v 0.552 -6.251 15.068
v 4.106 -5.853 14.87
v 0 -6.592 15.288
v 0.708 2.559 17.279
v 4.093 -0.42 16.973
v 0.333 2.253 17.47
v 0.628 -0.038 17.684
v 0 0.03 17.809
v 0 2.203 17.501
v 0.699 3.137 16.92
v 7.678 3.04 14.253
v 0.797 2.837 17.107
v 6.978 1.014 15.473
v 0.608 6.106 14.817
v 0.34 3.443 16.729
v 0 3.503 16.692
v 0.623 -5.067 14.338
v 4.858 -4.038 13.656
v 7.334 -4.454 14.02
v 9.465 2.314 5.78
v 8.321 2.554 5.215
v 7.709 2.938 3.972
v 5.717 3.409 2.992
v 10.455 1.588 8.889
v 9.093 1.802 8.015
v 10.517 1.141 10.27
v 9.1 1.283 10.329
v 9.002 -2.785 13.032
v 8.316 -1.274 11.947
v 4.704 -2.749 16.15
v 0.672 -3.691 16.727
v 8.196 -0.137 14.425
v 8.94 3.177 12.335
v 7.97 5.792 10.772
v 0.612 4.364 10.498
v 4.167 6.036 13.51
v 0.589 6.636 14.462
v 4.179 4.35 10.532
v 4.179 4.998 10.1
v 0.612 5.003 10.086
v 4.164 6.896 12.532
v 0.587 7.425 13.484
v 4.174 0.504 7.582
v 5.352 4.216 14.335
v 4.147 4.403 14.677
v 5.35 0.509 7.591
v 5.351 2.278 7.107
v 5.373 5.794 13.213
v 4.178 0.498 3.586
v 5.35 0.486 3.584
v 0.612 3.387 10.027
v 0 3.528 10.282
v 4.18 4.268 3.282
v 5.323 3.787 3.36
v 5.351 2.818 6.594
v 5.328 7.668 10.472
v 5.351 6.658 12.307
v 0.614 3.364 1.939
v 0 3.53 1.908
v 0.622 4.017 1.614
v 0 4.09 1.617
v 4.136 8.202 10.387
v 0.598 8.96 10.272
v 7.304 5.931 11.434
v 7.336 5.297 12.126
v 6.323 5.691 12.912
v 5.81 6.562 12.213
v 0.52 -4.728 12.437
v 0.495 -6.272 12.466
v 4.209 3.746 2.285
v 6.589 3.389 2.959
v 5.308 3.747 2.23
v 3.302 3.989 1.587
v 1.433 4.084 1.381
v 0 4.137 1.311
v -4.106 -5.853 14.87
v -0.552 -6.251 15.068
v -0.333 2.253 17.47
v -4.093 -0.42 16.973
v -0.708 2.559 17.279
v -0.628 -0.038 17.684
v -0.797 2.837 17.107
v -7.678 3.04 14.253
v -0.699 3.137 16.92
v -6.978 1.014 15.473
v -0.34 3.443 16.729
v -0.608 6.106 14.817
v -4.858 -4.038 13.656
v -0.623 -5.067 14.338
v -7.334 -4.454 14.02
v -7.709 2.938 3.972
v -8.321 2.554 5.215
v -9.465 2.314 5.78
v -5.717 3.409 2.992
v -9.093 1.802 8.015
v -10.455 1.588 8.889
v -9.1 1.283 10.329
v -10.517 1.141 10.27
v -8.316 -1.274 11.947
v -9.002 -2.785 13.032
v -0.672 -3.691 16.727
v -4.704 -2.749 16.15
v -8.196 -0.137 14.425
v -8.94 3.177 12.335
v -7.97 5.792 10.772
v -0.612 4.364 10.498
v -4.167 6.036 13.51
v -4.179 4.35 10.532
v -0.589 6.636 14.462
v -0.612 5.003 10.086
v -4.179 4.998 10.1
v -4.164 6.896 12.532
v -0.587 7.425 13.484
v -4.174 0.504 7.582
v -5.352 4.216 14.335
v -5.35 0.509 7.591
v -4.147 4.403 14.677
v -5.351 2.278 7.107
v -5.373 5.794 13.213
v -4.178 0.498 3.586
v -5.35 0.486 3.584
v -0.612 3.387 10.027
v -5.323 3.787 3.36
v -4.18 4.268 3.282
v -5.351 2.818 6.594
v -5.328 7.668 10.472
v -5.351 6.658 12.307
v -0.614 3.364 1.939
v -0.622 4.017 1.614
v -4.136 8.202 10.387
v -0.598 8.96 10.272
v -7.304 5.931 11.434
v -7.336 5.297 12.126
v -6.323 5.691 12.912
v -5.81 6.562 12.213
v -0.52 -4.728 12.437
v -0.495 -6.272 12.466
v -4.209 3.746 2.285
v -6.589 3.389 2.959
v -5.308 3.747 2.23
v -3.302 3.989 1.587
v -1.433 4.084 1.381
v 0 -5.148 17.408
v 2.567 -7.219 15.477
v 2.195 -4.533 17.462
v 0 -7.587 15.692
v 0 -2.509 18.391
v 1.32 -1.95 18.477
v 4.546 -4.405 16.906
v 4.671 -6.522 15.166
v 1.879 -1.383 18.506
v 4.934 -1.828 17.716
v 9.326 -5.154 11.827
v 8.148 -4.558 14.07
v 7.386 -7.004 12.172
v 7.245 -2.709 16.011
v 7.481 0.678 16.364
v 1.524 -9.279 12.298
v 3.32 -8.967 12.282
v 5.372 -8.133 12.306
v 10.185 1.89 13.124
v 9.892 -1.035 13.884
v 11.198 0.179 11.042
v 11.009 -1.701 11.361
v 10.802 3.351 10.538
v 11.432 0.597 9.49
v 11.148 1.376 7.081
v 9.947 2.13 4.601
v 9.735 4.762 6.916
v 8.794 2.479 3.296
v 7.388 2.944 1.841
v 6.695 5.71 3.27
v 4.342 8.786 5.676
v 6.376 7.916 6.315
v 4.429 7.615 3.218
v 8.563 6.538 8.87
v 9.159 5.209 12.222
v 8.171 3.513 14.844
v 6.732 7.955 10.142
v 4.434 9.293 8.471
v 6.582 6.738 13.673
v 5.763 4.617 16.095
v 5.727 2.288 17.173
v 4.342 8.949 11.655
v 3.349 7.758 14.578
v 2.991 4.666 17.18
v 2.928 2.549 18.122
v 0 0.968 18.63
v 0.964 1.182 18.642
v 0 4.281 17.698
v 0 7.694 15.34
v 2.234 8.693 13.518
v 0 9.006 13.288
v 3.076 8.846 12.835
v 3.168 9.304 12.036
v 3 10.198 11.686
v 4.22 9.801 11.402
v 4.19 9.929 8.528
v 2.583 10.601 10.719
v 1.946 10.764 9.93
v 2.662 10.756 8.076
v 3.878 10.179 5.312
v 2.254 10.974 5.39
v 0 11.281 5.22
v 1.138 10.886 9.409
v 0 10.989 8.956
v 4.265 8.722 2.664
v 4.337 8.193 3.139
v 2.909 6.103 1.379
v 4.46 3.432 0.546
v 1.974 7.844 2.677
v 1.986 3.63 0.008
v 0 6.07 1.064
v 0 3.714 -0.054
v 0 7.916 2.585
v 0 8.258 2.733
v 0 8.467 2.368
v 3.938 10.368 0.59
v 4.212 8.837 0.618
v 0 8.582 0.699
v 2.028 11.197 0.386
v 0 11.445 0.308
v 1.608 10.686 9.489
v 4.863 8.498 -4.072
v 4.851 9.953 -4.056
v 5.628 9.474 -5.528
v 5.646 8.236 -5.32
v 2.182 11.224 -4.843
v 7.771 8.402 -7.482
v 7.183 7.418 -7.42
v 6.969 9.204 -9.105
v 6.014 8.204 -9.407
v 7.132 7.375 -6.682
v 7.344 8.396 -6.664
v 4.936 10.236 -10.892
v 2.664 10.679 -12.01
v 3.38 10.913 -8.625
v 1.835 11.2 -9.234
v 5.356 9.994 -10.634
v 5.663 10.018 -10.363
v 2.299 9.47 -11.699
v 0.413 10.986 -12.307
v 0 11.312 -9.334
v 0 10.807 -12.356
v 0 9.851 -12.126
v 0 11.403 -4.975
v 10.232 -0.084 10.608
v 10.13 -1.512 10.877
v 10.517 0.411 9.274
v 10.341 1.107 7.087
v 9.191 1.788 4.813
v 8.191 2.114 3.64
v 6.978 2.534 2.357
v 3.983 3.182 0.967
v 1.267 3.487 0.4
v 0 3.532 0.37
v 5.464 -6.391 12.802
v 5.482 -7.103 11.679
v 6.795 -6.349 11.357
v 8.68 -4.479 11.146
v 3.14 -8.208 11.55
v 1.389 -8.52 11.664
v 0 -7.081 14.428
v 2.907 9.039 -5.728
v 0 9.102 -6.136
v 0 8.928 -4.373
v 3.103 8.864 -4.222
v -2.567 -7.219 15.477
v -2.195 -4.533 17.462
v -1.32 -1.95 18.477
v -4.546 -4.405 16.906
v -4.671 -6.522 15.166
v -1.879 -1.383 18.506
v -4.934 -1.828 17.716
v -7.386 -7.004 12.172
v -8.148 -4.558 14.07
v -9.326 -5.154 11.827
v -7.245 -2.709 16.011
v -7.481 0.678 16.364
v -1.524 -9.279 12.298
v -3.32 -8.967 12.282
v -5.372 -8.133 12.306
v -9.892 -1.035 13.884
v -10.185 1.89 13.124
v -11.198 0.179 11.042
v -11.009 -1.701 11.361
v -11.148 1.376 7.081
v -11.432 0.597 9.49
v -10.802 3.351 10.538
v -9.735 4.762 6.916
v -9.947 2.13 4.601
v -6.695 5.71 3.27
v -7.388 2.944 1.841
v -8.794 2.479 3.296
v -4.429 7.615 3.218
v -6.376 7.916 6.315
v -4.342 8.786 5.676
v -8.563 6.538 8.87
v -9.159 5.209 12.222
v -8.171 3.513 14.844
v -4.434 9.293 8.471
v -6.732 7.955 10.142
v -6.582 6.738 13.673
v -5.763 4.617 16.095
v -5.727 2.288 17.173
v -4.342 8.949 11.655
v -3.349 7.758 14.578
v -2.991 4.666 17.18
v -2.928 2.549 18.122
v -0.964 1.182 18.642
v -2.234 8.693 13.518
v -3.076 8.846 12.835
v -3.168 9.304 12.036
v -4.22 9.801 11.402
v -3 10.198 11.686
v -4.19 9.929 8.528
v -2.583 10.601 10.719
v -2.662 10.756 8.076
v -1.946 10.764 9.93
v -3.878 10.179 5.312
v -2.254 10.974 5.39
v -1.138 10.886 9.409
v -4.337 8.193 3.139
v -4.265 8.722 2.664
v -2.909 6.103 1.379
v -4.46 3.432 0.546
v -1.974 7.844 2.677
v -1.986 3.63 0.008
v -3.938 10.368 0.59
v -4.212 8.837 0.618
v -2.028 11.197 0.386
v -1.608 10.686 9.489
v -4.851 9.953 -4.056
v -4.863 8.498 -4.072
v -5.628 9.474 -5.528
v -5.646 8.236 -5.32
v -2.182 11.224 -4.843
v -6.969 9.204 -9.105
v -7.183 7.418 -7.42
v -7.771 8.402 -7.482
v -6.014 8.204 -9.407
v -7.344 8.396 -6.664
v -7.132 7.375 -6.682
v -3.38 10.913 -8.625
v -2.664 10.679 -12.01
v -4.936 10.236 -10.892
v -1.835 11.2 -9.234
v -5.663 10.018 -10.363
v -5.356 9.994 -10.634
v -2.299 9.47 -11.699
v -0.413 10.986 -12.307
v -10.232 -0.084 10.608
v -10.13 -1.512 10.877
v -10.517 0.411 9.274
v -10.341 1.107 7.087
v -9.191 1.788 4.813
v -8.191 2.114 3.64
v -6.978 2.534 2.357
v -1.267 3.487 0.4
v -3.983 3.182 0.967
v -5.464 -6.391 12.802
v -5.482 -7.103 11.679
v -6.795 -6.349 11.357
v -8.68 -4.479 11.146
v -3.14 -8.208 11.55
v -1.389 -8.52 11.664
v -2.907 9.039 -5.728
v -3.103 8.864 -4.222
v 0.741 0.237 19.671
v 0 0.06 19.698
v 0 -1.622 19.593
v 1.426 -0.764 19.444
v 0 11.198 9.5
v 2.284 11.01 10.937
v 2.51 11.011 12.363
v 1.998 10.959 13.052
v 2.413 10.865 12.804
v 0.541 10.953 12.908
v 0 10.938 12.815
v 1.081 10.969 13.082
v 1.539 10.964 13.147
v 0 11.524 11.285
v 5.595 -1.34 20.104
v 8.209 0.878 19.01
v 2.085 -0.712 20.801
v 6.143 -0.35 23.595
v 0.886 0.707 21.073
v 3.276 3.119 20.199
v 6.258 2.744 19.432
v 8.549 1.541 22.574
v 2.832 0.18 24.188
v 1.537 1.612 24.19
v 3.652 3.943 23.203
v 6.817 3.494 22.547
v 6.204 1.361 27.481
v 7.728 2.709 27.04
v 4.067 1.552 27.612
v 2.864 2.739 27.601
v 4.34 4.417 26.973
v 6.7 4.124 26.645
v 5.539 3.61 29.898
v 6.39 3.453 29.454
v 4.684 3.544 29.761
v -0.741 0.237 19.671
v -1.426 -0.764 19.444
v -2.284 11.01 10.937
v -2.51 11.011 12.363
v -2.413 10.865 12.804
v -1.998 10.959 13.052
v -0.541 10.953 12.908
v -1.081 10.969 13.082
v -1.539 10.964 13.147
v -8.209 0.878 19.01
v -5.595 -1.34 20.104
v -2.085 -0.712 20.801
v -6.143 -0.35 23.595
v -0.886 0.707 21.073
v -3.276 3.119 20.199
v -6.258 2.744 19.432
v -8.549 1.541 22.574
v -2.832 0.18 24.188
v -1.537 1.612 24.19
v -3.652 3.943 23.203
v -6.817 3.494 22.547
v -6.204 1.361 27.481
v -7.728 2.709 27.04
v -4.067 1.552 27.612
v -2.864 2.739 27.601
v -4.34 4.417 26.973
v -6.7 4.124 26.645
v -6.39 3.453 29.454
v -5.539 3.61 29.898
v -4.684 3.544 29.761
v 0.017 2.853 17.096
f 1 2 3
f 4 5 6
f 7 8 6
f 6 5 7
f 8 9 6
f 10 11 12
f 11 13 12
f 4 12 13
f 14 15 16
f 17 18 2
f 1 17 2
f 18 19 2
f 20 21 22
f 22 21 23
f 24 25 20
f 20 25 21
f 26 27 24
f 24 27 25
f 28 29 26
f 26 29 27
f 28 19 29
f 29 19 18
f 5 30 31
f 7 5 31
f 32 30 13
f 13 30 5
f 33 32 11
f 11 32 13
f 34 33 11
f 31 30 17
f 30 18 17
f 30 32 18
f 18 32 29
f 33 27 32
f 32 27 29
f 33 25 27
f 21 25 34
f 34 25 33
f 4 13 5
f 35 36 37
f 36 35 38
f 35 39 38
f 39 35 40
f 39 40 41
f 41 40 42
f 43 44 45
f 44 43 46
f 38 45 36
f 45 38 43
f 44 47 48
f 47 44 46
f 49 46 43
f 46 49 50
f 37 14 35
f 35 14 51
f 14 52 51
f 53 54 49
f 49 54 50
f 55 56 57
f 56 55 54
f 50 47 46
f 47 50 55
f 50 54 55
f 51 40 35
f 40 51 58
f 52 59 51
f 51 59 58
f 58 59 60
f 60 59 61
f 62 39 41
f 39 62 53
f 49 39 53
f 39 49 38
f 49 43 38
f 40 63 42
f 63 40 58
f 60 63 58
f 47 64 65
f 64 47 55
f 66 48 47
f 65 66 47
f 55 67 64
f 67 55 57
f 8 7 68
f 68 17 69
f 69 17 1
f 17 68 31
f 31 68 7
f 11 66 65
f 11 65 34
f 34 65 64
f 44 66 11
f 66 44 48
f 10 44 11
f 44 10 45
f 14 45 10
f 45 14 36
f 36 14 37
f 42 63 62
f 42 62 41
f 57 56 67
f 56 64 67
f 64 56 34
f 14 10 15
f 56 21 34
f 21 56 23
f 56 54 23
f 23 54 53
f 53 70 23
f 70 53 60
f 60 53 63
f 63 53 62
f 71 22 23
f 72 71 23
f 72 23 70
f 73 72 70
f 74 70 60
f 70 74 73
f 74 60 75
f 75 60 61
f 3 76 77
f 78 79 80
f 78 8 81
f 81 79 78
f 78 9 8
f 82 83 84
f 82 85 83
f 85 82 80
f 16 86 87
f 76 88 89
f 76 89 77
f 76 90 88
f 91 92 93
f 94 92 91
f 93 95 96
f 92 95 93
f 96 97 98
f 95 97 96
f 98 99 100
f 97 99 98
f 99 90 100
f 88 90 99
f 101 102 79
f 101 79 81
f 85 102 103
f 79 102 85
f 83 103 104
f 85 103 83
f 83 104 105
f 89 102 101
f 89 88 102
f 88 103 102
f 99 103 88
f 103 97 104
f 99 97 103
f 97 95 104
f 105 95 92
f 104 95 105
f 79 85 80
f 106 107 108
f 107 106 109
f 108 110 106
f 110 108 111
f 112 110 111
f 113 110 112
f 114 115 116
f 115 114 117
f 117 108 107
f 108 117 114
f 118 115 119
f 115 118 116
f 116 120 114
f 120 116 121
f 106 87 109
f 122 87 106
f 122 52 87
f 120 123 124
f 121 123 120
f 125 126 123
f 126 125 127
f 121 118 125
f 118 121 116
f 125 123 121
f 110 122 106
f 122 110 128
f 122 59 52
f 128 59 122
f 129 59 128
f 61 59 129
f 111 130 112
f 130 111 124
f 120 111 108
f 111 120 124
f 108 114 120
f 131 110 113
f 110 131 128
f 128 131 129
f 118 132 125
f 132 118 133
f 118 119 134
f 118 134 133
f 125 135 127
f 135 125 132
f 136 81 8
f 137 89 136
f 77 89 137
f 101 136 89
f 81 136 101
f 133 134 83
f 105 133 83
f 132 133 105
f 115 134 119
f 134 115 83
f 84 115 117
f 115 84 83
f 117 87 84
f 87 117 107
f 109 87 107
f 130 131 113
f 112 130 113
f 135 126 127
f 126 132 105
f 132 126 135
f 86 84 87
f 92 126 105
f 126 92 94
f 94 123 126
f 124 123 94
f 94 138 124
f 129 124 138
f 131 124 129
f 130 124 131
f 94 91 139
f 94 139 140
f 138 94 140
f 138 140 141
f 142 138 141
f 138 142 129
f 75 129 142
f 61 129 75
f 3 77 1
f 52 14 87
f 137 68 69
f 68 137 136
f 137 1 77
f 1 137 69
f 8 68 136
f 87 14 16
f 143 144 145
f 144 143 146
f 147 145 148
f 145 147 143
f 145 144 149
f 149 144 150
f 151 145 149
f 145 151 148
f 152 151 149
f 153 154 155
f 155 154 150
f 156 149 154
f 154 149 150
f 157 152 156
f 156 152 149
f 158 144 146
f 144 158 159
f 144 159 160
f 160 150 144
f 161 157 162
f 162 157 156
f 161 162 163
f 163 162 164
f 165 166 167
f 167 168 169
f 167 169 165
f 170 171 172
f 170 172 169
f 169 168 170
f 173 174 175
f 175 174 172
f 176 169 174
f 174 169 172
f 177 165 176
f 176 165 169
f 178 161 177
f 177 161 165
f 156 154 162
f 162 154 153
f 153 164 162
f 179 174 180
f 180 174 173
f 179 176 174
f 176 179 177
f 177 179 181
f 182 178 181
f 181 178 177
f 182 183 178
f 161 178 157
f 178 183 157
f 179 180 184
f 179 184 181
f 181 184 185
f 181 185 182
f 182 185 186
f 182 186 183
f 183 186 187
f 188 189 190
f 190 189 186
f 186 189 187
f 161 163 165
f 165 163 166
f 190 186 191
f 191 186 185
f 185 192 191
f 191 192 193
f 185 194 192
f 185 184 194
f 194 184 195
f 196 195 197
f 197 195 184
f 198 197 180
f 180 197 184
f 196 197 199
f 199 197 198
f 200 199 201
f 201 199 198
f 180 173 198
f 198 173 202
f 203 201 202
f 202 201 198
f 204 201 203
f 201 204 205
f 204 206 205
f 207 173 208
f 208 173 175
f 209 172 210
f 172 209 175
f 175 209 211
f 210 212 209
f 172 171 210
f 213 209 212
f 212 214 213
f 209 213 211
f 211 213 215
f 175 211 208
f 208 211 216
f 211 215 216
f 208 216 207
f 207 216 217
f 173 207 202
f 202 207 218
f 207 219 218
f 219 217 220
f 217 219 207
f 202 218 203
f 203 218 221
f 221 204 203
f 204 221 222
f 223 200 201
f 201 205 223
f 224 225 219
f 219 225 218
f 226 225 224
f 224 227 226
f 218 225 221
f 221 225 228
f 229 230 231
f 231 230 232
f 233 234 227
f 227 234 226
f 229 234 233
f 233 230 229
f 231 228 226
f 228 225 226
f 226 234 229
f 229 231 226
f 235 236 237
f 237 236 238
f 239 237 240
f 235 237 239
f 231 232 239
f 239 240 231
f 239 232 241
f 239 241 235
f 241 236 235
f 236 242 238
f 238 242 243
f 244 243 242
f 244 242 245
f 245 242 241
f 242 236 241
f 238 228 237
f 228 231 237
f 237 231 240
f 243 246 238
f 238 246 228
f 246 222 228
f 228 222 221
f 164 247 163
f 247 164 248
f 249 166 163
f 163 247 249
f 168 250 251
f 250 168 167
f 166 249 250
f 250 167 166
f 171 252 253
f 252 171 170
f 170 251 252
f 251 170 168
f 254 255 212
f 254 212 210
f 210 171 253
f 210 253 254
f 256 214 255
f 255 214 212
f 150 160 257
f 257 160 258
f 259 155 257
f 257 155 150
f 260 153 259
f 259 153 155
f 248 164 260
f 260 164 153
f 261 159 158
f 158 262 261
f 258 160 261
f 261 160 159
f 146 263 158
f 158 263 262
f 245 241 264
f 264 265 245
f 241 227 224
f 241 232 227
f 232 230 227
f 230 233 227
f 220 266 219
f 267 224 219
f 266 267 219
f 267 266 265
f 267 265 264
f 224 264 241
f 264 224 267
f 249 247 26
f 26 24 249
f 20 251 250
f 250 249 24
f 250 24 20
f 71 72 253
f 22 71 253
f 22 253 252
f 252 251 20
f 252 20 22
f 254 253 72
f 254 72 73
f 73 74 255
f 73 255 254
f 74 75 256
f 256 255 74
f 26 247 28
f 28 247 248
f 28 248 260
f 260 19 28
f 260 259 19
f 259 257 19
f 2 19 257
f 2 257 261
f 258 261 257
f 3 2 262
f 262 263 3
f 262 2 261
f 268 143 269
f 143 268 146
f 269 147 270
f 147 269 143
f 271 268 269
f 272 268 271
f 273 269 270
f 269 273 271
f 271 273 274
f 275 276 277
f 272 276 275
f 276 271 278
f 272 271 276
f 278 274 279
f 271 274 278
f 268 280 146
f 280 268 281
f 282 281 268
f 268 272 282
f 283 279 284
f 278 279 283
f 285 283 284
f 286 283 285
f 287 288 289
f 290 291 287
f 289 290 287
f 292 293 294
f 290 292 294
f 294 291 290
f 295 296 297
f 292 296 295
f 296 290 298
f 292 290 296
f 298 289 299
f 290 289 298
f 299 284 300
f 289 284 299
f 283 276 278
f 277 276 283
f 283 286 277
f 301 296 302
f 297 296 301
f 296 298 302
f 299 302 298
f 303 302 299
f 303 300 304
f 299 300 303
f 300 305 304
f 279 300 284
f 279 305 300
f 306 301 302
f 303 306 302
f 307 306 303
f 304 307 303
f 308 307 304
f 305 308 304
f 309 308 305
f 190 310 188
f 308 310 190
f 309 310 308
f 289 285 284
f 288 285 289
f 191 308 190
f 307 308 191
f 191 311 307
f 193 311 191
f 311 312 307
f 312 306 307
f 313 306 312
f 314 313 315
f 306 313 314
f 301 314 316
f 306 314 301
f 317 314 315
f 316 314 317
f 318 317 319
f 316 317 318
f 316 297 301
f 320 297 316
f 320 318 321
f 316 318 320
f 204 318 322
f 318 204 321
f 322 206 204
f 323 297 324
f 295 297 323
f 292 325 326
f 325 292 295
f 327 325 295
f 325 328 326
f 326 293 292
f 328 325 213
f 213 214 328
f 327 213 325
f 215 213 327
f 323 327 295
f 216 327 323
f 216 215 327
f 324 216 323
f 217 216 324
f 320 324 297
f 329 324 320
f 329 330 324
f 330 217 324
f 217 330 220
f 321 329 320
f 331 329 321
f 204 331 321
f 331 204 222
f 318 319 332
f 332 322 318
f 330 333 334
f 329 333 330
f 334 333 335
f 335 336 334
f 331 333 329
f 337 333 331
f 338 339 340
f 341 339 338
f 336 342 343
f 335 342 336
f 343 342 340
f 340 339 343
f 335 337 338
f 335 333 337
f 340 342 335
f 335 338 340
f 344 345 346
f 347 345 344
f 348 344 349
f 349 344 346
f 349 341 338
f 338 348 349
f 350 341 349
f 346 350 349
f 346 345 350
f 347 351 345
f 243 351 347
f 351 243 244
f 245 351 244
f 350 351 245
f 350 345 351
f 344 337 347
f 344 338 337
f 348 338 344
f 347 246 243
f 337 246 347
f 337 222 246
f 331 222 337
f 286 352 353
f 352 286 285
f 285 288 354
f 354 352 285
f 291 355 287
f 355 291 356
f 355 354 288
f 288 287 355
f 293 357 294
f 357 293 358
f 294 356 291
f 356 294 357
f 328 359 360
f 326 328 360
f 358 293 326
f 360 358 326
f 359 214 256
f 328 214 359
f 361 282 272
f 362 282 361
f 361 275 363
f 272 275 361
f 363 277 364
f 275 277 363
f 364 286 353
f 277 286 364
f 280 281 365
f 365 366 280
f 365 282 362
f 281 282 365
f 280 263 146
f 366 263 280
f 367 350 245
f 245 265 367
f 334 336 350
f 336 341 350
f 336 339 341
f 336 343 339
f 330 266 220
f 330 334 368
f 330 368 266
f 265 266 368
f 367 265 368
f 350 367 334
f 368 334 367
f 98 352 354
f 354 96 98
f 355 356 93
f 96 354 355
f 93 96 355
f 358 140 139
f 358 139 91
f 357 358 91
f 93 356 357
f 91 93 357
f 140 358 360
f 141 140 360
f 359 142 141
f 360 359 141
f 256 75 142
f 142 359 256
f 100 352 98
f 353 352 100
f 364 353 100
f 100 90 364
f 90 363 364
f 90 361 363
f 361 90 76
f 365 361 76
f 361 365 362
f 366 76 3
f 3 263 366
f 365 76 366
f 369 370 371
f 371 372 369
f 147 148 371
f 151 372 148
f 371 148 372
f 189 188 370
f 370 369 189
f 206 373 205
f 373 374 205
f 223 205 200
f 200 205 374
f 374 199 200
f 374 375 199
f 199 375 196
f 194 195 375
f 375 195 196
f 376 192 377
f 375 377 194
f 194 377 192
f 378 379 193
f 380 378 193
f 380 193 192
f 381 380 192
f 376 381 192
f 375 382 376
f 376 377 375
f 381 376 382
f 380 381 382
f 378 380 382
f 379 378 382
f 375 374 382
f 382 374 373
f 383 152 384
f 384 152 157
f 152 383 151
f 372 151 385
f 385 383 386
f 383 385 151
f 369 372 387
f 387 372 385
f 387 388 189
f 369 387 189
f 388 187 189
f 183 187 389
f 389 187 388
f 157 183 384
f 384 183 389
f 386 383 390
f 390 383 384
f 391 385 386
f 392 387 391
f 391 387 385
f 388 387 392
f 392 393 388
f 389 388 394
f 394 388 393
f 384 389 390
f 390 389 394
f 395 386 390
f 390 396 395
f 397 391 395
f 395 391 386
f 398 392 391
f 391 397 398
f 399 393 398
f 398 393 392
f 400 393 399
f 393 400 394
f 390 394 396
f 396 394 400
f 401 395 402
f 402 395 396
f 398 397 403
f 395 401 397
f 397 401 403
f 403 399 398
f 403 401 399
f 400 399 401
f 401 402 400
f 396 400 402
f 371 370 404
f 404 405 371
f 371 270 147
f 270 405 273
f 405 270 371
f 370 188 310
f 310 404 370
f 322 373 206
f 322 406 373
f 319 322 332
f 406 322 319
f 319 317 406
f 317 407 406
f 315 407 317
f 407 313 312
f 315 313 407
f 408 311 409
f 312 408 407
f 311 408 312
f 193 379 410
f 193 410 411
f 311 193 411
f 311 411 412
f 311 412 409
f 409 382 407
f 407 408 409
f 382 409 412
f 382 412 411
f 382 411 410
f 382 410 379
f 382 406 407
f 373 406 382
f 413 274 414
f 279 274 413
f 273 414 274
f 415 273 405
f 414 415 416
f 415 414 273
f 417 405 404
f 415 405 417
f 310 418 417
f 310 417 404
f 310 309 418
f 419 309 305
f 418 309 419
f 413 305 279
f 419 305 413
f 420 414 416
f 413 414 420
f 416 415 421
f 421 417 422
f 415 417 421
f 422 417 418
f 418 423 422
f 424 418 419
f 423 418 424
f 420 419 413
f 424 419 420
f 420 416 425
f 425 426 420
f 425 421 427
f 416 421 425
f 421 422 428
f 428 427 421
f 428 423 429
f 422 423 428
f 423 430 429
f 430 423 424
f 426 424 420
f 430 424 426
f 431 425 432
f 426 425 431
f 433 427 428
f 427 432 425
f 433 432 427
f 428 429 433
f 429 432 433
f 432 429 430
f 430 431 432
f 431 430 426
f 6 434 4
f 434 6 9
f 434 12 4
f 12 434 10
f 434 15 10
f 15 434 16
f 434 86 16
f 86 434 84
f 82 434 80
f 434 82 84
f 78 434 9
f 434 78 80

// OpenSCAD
use <../lib.scad>
use <s/u9440s01.scad>
use <s/u9440s02.scad>
use <s/u9447s01.scad>
function ldraw_lib__u9440p01() = [
// 0 ~Minifig Hair Powerpuff Girls Blossom with Red Bowtie Pattern
// 0 Name: u9440p01.dat
// 0 Author: Magnus Forsberg [MagFors]
// 0 !LDRAW_ORG Part UPDATE 2023-05
// 0 !LICENSE Licensed under CC BY 4.0 : see CAreadme.txt
// 
// 0 BFC CERTIFY CCW
  [0,"BFC","CERTIFY"],
  [0,"BFC","CCW"],
// 
// 0 !KEYWORDS set 41288
// 
// 0 !HISTORY 2023-10-31 [OrionP] Official Update 2023-05
// 
// 
// 1 16 0 0 0 1 0 0 0 1 0 0 0 1 s\u9447s01.dat
  [1,16,0,0,0,1,0,0,0,1,0,0,0,1, ldraw_lib__s__u9447s01()],
// 1 16 0 0 0 1 0 0 0 1 0 0 0 1 s\u9440s01.dat
  [1,16,0,0,0,1,0,0,0,1,0,0,0,1, ldraw_lib__s__u9440s01()],
// 1 16 0 0 0 -1 0 0 0 1 0 0 0 1 s\u9440s01.dat
  [1,16,0,0,0,-1,0,0,0,1,0,0,0,1, ldraw_lib__s__u9440s01()],
// 1 4 0 0 0 1 0 0 0 1 0 0 0 1 s\u9440s02.dat
  [1,4,0,0,0,1,0,0,0,1,0,0,0,1, ldraw_lib__s__u9440s02()],
// 1 4 0 0 0 -1 0 0 0 1 0 0 0 1 s\u9440s02.dat
  [1,4,0,0,0,-1,0,0,0,1,0,0,0,1, ldraw_lib__s__u9440s02()],
// 
// 4 16 .833 -43.674 5.633 0 -43.753 5.507 .042 -42.741 7.1325 1.77 -43.198 6.398
  [4,16,.833,-43.674,5.633,0,-43.753,5.507,.042,-42.741,7.1325,1.77,-43.198,6.398],
// 4 16 1.993 -42.767 7.092 1.77 -43.198 6.398 .042 -42.741 7.1325 1.747 -42.299 7.842
  [4,16,1.993,-42.767,7.092,1.77,-43.198,6.398,.042,-42.741,7.1325,1.747,-42.299,7.842],
// 4 16 .85 -41.823 8.608 1.747 -42.299 7.842 .042 -42.741 7.1325 0 -41.729 8.758
  [4,16,.85,-41.823,8.608,1.747,-42.299,7.842,.042,-42.741,7.1325,0,-41.729,8.758],
// 4 16 -.85 -41.823 8.608 0 -41.729 8.758 .042 -42.741 7.1325 -1.747 -42.299 7.842
  [4,16,-.85,-41.823,8.608,0,-41.729,8.758,.042,-42.741,7.1325,-1.747,-42.299,7.842],
// 4 16 -1.993 -42.767 7.092 -1.747 -42.299 7.842 .042 -42.741 7.1325 -1.77 -43.198 6.398
  [4,16,-1.993,-42.767,7.092,-1.747,-42.299,7.842,.042,-42.741,7.1325,-1.77,-43.198,6.398],
// 4 16 -.833 -43.674 5.633 -1.77 -43.198 6.398 .042 -42.741 7.1325 0 -43.753 5.507
  [4,16,-.833,-43.674,5.633,-1.77,-43.198,6.398,.042,-42.741,7.1325,0,-43.753,5.507],
// 5 24 0 -41.729 8.758 -.85 -41.823 8.608 -1.435 -37.043 15.265 .042 -42.741 7.1325
  [5,24,0,-41.729,8.758,-.85,-41.823,8.608,-1.435,-37.043,15.265,.042,-42.741,7.1325],
// 5 24 -1.77 -43.198 6.398 -.833 -43.674 5.633 .042 -42.741 7.1325 -10.148 -42.433 -1.051
  [5,24,-1.77,-43.198,6.398,-.833,-43.674,5.633,.042,-42.741,7.1325,-10.148,-42.433,-1.051],
// 5 24 1.747 -42.299 7.842 .85 -41.823 8.608 .042 -42.741 7.1325 1.519 -37.043 15.265
  [5,24,1.747,-42.299,7.842,.85,-41.823,8.608,.042,-42.741,7.1325,1.519,-37.043,15.265],
// 5 24 -1.747 -42.299 7.842 -1.993 -42.767 7.092 .042 -42.741 7.1325 -19.11 -35.633 7.599
  [5,24,-1.747,-42.299,7.842,-1.993,-42.767,7.092,.042,-42.741,7.1325,-19.11,-35.633,7.599],
// 5 24 -1.993 -42.767 7.092 -1.77 -43.198 6.398 -1.747 -42.299 7.842 -17.36 -38.683 2.536
  [5,24,-1.993,-42.767,7.092,-1.77,-43.198,6.398,-1.747,-42.299,7.842,-17.36,-38.683,2.536],
// 5 24 .833 -43.674 5.633 1.77 -43.198 6.398 0 -43.753 5.507 10.232 -42.433 -1.051
  [5,24,.833,-43.674,5.633,1.77,-43.198,6.398,0,-43.753,5.507,10.232,-42.433,-1.051],
// 5 24 1.77 -43.198 6.398 1.993 -42.767 7.092 .042 -42.741 7.1325 17.444 -38.683 2.536
  [5,24,1.77,-43.198,6.398,1.993,-42.767,7.092,.042,-42.741,7.1325,17.444,-38.683,2.536],
// 5 24 .85 -41.823 8.608 0 -41.729 8.758 1.519 -37.043 15.265 1.747 -42.299 7.842
  [5,24,.85,-41.823,8.608,0,-41.729,8.758,1.519,-37.043,15.265,1.747,-42.299,7.842],
// 5 24 -.85 -41.823 8.608 -1.747 -42.299 7.842 -1.435 -37.043 15.265 0 -41.729 8.758
  [5,24,-.85,-41.823,8.608,-1.747,-42.299,7.842,-1.435,-37.043,15.265,0,-41.729,8.758],
// 5 24 -.833 -43.674 5.633 0 -43.753 5.507 -1.77 -43.198 6.398 0 -44.522 .075
  [5,24,-.833,-43.674,5.633,0,-43.753,5.507,-1.77,-43.198,6.398,0,-44.522,.075],
// 5 24 0 -43.753 5.507 .833 -43.674 5.633 0 -44.522 .075 .042 -42.741 7.1325
  [5,24,0,-43.753,5.507,.833,-43.674,5.633,0,-44.522,.075,.042,-42.741,7.1325],
// 5 24 1.993 -42.767 7.092 1.747 -42.299 7.842 1.77 -43.198 6.398 19.194 -35.633 7.599
  [5,24,1.993,-42.767,7.092,1.747,-42.299,7.842,1.77,-43.198,6.398,19.194,-35.633,7.599],
// 
// 2 24 0 23.334 28.281 0 30.889 27.017
  [2,24,0,23.334,28.281,0,30.889,27.017],
// 2 24 0 -36.071 -17.703 0 -39.231 -18.968
  [2,24,0,-36.071,-17.703,0,-39.231,-18.968],
// 5 24 0 -45.978 -6.272 0 -43.521 -12.871 3.301 -46.192 -4.874 -3.301 -46.192 -4.874
  [5,24,0,-45.978,-6.272,0,-43.521,-12.871,3.301,-46.192,-4.874,-3.301,-46.192,-4.874],
// 5 24 0 -43.521 -12.871 0 -39.231 -18.968 5.487 -43.655 -11.333 -5.487 -43.655 -11.333
  [5,24,0,-43.521,-12.871,0,-39.231,-18.968,5.487,-43.655,-11.333,-5.487,-43.655,-11.333],
// 5 24 0 -44.245 10.702 0 -46.576 2.42 2.41 -46.605 2.955 -2.41 -46.605 2.955
  [5,24,0,-44.245,10.702,0,-46.576,2.42,2.41,-46.605,2.955,-2.41,-46.605,2.955],
// 5 24 0 -33.221 22.515 0 -38.35 19.234 5.585 -33.795 21.733 -5.585 -33.795 21.733
  [5,24,0,-33.221,22.515,0,-38.35,19.234,5.585,-33.795,21.733,-5.585,-33.795,21.733],
// 5 24 0 -38.35 19.234 0 -44.245 10.702 -7.478 -42.95 11.666 7.478 -42.95 11.666
  [5,24,0,-38.35,19.234,0,-44.245,10.702,-7.478,-42.95,11.666,7.478,-42.95,11.666],
// 5 24 0 -.769 28.612 0 -13.049 28.203 5.069 -.964 27.993 -5.069 -.964 27.993
  [5,24,0,-.769,28.612,0,-13.049,28.203,5.069,-.964,27.993,-5.069,-.964,27.993],
// 5 24 0 30.316 24.627 0 30.889 27.017 1.032 30.768 27.464 -1.032 30.768 27.464
  [5,24,0,30.316,24.627,0,30.889,27.017,1.032,30.768,27.464,-1.032,30.768,27.464],
// 5 24 0 -13.049 28.203 0 -22.389 27.473 2.845 -23.523 27.216 -2.845 -23.523 27.216
  [5,24,0,-13.049,28.203,0,-22.389,27.473,2.845,-23.523,27.216,-2.845,-23.523,27.216],
// 5 24 0 12.438 28.507 0 -.769 28.612 5.455 12.107 28.059 -5.455 12.107 28.059
  [5,24,0,12.438,28.507,0,-.769,28.612,5.455,12.107,28.059,-5.455,12.107,28.059],
// 5 24 0 -1.748 21.454 0 10.932 22.321 10.531 -1.546 22.093 -10.531 -1.546 22.093
  [5,24,0,-1.748,21.454,0,10.932,22.321,10.531,-1.546,22.093,-10.531,-1.546,22.093],
// 5 24 0 -5.921 21.168 0 -1.748 21.454 10.531 -1.546 22.093 -10.531 -1.546 22.093
  [5,24,0,-5.921,21.168,0,-1.748,21.454,10.531,-1.546,22.093,-10.531,-1.546,22.093],
// 5 24 0 -6.832 20.645 0 -5.921 21.168 10.663 -6.66 21.806 -10.663 -6.66 21.806
  [5,24,0,-6.832,20.645,0,-5.921,21.168,10.663,-6.66,21.806,-10.663,-6.66,21.806],
// 5 24 0 -6.462 19.791 0 -6.832 20.645 4.934 -6.692 19.611 -4.934 -6.692 19.611
  [5,24,0,-6.462,19.791,0,-6.832,20.645,4.934,-6.692,19.611,-4.934,-6.692,19.611],
// 5 24 0 -2.661 15.174 0 -6.462 19.791 -4.934 -6.692 19.611 4.934 -6.692 19.611
  [5,24,0,-2.661,15.174,0,-6.462,19.791,-4.934,-6.692,19.611,4.934,-6.692,19.611],
// 5 24 0 30.316 24.627 0 15.341 22.756 5.748 29.248 23.676 -5.748 29.248 23.676
  [5,24,0,30.316,24.627,0,15.341,22.756,5.748,29.248,23.676,-5.748,29.248,23.676],
// 5 24 0 23.334 28.281 0 12.438 28.507 4.587 23.086 28.001 -4.587 23.086 28.001
  [5,24,0,23.334,28.281,0,12.438,28.507,4.587,23.086,28.001,-4.587,23.086,28.001],
// 5 24 0 -.926 8.829 0 .135 9.286 3.168 -1.001 8.718 -3.168 -1.001 8.718
  [5,24,0,-.926,8.829,0,.135,9.286,3.168,-1.001,8.718,-3.168,-1.001,8.718],
// 5 24 0 -36.071 -17.703 0 -38.22 -16.481 3.472 -29.16 -21.299 -3.472 -29.16 -21.299
  [5,24,0,-36.071,-17.703,0,-38.22,-16.481,3.472,-29.16,-21.299,-3.472,-29.16,-21.299],
// 5 24 0 -3.278 10.342 0 -.926 8.829 -3.583 -3.453 10.211 3.583 -3.453 10.211
  [5,24,0,-3.278,10.342,0,-.926,8.829,-3.583,-3.453,10.211,3.583,-3.453,10.211],
// 5 24 0 .135 9.286 0 -2.661 15.174 4.966 -.019 9.074 -4.966 -.019 9.074
  [5,24,0,.135,9.286,0,-2.661,15.174,4.966,-.019,9.074,-4.966,-.019,9.074],
// 5 24 0 10.932 22.321 0 15.341 22.756 -7.7585 10.556 22.161 7.7585 10.556 22.161
  [5,24,0,10.932,22.321,0,15.341,22.756,-7.7585,10.556,22.161,7.7585,10.556,22.161],
];
module ldraw_lib__u9440p01(step=0, col=false, unit=2/5, alt=false, line=0.2, solid=!$preview)
    makepoly(ldraw_lib__u9440p01(), step=step, col=col, unit=unit, alt=alt, line=line, solid=solid);
ldraw_lib__u9440p01(line=0.2);
